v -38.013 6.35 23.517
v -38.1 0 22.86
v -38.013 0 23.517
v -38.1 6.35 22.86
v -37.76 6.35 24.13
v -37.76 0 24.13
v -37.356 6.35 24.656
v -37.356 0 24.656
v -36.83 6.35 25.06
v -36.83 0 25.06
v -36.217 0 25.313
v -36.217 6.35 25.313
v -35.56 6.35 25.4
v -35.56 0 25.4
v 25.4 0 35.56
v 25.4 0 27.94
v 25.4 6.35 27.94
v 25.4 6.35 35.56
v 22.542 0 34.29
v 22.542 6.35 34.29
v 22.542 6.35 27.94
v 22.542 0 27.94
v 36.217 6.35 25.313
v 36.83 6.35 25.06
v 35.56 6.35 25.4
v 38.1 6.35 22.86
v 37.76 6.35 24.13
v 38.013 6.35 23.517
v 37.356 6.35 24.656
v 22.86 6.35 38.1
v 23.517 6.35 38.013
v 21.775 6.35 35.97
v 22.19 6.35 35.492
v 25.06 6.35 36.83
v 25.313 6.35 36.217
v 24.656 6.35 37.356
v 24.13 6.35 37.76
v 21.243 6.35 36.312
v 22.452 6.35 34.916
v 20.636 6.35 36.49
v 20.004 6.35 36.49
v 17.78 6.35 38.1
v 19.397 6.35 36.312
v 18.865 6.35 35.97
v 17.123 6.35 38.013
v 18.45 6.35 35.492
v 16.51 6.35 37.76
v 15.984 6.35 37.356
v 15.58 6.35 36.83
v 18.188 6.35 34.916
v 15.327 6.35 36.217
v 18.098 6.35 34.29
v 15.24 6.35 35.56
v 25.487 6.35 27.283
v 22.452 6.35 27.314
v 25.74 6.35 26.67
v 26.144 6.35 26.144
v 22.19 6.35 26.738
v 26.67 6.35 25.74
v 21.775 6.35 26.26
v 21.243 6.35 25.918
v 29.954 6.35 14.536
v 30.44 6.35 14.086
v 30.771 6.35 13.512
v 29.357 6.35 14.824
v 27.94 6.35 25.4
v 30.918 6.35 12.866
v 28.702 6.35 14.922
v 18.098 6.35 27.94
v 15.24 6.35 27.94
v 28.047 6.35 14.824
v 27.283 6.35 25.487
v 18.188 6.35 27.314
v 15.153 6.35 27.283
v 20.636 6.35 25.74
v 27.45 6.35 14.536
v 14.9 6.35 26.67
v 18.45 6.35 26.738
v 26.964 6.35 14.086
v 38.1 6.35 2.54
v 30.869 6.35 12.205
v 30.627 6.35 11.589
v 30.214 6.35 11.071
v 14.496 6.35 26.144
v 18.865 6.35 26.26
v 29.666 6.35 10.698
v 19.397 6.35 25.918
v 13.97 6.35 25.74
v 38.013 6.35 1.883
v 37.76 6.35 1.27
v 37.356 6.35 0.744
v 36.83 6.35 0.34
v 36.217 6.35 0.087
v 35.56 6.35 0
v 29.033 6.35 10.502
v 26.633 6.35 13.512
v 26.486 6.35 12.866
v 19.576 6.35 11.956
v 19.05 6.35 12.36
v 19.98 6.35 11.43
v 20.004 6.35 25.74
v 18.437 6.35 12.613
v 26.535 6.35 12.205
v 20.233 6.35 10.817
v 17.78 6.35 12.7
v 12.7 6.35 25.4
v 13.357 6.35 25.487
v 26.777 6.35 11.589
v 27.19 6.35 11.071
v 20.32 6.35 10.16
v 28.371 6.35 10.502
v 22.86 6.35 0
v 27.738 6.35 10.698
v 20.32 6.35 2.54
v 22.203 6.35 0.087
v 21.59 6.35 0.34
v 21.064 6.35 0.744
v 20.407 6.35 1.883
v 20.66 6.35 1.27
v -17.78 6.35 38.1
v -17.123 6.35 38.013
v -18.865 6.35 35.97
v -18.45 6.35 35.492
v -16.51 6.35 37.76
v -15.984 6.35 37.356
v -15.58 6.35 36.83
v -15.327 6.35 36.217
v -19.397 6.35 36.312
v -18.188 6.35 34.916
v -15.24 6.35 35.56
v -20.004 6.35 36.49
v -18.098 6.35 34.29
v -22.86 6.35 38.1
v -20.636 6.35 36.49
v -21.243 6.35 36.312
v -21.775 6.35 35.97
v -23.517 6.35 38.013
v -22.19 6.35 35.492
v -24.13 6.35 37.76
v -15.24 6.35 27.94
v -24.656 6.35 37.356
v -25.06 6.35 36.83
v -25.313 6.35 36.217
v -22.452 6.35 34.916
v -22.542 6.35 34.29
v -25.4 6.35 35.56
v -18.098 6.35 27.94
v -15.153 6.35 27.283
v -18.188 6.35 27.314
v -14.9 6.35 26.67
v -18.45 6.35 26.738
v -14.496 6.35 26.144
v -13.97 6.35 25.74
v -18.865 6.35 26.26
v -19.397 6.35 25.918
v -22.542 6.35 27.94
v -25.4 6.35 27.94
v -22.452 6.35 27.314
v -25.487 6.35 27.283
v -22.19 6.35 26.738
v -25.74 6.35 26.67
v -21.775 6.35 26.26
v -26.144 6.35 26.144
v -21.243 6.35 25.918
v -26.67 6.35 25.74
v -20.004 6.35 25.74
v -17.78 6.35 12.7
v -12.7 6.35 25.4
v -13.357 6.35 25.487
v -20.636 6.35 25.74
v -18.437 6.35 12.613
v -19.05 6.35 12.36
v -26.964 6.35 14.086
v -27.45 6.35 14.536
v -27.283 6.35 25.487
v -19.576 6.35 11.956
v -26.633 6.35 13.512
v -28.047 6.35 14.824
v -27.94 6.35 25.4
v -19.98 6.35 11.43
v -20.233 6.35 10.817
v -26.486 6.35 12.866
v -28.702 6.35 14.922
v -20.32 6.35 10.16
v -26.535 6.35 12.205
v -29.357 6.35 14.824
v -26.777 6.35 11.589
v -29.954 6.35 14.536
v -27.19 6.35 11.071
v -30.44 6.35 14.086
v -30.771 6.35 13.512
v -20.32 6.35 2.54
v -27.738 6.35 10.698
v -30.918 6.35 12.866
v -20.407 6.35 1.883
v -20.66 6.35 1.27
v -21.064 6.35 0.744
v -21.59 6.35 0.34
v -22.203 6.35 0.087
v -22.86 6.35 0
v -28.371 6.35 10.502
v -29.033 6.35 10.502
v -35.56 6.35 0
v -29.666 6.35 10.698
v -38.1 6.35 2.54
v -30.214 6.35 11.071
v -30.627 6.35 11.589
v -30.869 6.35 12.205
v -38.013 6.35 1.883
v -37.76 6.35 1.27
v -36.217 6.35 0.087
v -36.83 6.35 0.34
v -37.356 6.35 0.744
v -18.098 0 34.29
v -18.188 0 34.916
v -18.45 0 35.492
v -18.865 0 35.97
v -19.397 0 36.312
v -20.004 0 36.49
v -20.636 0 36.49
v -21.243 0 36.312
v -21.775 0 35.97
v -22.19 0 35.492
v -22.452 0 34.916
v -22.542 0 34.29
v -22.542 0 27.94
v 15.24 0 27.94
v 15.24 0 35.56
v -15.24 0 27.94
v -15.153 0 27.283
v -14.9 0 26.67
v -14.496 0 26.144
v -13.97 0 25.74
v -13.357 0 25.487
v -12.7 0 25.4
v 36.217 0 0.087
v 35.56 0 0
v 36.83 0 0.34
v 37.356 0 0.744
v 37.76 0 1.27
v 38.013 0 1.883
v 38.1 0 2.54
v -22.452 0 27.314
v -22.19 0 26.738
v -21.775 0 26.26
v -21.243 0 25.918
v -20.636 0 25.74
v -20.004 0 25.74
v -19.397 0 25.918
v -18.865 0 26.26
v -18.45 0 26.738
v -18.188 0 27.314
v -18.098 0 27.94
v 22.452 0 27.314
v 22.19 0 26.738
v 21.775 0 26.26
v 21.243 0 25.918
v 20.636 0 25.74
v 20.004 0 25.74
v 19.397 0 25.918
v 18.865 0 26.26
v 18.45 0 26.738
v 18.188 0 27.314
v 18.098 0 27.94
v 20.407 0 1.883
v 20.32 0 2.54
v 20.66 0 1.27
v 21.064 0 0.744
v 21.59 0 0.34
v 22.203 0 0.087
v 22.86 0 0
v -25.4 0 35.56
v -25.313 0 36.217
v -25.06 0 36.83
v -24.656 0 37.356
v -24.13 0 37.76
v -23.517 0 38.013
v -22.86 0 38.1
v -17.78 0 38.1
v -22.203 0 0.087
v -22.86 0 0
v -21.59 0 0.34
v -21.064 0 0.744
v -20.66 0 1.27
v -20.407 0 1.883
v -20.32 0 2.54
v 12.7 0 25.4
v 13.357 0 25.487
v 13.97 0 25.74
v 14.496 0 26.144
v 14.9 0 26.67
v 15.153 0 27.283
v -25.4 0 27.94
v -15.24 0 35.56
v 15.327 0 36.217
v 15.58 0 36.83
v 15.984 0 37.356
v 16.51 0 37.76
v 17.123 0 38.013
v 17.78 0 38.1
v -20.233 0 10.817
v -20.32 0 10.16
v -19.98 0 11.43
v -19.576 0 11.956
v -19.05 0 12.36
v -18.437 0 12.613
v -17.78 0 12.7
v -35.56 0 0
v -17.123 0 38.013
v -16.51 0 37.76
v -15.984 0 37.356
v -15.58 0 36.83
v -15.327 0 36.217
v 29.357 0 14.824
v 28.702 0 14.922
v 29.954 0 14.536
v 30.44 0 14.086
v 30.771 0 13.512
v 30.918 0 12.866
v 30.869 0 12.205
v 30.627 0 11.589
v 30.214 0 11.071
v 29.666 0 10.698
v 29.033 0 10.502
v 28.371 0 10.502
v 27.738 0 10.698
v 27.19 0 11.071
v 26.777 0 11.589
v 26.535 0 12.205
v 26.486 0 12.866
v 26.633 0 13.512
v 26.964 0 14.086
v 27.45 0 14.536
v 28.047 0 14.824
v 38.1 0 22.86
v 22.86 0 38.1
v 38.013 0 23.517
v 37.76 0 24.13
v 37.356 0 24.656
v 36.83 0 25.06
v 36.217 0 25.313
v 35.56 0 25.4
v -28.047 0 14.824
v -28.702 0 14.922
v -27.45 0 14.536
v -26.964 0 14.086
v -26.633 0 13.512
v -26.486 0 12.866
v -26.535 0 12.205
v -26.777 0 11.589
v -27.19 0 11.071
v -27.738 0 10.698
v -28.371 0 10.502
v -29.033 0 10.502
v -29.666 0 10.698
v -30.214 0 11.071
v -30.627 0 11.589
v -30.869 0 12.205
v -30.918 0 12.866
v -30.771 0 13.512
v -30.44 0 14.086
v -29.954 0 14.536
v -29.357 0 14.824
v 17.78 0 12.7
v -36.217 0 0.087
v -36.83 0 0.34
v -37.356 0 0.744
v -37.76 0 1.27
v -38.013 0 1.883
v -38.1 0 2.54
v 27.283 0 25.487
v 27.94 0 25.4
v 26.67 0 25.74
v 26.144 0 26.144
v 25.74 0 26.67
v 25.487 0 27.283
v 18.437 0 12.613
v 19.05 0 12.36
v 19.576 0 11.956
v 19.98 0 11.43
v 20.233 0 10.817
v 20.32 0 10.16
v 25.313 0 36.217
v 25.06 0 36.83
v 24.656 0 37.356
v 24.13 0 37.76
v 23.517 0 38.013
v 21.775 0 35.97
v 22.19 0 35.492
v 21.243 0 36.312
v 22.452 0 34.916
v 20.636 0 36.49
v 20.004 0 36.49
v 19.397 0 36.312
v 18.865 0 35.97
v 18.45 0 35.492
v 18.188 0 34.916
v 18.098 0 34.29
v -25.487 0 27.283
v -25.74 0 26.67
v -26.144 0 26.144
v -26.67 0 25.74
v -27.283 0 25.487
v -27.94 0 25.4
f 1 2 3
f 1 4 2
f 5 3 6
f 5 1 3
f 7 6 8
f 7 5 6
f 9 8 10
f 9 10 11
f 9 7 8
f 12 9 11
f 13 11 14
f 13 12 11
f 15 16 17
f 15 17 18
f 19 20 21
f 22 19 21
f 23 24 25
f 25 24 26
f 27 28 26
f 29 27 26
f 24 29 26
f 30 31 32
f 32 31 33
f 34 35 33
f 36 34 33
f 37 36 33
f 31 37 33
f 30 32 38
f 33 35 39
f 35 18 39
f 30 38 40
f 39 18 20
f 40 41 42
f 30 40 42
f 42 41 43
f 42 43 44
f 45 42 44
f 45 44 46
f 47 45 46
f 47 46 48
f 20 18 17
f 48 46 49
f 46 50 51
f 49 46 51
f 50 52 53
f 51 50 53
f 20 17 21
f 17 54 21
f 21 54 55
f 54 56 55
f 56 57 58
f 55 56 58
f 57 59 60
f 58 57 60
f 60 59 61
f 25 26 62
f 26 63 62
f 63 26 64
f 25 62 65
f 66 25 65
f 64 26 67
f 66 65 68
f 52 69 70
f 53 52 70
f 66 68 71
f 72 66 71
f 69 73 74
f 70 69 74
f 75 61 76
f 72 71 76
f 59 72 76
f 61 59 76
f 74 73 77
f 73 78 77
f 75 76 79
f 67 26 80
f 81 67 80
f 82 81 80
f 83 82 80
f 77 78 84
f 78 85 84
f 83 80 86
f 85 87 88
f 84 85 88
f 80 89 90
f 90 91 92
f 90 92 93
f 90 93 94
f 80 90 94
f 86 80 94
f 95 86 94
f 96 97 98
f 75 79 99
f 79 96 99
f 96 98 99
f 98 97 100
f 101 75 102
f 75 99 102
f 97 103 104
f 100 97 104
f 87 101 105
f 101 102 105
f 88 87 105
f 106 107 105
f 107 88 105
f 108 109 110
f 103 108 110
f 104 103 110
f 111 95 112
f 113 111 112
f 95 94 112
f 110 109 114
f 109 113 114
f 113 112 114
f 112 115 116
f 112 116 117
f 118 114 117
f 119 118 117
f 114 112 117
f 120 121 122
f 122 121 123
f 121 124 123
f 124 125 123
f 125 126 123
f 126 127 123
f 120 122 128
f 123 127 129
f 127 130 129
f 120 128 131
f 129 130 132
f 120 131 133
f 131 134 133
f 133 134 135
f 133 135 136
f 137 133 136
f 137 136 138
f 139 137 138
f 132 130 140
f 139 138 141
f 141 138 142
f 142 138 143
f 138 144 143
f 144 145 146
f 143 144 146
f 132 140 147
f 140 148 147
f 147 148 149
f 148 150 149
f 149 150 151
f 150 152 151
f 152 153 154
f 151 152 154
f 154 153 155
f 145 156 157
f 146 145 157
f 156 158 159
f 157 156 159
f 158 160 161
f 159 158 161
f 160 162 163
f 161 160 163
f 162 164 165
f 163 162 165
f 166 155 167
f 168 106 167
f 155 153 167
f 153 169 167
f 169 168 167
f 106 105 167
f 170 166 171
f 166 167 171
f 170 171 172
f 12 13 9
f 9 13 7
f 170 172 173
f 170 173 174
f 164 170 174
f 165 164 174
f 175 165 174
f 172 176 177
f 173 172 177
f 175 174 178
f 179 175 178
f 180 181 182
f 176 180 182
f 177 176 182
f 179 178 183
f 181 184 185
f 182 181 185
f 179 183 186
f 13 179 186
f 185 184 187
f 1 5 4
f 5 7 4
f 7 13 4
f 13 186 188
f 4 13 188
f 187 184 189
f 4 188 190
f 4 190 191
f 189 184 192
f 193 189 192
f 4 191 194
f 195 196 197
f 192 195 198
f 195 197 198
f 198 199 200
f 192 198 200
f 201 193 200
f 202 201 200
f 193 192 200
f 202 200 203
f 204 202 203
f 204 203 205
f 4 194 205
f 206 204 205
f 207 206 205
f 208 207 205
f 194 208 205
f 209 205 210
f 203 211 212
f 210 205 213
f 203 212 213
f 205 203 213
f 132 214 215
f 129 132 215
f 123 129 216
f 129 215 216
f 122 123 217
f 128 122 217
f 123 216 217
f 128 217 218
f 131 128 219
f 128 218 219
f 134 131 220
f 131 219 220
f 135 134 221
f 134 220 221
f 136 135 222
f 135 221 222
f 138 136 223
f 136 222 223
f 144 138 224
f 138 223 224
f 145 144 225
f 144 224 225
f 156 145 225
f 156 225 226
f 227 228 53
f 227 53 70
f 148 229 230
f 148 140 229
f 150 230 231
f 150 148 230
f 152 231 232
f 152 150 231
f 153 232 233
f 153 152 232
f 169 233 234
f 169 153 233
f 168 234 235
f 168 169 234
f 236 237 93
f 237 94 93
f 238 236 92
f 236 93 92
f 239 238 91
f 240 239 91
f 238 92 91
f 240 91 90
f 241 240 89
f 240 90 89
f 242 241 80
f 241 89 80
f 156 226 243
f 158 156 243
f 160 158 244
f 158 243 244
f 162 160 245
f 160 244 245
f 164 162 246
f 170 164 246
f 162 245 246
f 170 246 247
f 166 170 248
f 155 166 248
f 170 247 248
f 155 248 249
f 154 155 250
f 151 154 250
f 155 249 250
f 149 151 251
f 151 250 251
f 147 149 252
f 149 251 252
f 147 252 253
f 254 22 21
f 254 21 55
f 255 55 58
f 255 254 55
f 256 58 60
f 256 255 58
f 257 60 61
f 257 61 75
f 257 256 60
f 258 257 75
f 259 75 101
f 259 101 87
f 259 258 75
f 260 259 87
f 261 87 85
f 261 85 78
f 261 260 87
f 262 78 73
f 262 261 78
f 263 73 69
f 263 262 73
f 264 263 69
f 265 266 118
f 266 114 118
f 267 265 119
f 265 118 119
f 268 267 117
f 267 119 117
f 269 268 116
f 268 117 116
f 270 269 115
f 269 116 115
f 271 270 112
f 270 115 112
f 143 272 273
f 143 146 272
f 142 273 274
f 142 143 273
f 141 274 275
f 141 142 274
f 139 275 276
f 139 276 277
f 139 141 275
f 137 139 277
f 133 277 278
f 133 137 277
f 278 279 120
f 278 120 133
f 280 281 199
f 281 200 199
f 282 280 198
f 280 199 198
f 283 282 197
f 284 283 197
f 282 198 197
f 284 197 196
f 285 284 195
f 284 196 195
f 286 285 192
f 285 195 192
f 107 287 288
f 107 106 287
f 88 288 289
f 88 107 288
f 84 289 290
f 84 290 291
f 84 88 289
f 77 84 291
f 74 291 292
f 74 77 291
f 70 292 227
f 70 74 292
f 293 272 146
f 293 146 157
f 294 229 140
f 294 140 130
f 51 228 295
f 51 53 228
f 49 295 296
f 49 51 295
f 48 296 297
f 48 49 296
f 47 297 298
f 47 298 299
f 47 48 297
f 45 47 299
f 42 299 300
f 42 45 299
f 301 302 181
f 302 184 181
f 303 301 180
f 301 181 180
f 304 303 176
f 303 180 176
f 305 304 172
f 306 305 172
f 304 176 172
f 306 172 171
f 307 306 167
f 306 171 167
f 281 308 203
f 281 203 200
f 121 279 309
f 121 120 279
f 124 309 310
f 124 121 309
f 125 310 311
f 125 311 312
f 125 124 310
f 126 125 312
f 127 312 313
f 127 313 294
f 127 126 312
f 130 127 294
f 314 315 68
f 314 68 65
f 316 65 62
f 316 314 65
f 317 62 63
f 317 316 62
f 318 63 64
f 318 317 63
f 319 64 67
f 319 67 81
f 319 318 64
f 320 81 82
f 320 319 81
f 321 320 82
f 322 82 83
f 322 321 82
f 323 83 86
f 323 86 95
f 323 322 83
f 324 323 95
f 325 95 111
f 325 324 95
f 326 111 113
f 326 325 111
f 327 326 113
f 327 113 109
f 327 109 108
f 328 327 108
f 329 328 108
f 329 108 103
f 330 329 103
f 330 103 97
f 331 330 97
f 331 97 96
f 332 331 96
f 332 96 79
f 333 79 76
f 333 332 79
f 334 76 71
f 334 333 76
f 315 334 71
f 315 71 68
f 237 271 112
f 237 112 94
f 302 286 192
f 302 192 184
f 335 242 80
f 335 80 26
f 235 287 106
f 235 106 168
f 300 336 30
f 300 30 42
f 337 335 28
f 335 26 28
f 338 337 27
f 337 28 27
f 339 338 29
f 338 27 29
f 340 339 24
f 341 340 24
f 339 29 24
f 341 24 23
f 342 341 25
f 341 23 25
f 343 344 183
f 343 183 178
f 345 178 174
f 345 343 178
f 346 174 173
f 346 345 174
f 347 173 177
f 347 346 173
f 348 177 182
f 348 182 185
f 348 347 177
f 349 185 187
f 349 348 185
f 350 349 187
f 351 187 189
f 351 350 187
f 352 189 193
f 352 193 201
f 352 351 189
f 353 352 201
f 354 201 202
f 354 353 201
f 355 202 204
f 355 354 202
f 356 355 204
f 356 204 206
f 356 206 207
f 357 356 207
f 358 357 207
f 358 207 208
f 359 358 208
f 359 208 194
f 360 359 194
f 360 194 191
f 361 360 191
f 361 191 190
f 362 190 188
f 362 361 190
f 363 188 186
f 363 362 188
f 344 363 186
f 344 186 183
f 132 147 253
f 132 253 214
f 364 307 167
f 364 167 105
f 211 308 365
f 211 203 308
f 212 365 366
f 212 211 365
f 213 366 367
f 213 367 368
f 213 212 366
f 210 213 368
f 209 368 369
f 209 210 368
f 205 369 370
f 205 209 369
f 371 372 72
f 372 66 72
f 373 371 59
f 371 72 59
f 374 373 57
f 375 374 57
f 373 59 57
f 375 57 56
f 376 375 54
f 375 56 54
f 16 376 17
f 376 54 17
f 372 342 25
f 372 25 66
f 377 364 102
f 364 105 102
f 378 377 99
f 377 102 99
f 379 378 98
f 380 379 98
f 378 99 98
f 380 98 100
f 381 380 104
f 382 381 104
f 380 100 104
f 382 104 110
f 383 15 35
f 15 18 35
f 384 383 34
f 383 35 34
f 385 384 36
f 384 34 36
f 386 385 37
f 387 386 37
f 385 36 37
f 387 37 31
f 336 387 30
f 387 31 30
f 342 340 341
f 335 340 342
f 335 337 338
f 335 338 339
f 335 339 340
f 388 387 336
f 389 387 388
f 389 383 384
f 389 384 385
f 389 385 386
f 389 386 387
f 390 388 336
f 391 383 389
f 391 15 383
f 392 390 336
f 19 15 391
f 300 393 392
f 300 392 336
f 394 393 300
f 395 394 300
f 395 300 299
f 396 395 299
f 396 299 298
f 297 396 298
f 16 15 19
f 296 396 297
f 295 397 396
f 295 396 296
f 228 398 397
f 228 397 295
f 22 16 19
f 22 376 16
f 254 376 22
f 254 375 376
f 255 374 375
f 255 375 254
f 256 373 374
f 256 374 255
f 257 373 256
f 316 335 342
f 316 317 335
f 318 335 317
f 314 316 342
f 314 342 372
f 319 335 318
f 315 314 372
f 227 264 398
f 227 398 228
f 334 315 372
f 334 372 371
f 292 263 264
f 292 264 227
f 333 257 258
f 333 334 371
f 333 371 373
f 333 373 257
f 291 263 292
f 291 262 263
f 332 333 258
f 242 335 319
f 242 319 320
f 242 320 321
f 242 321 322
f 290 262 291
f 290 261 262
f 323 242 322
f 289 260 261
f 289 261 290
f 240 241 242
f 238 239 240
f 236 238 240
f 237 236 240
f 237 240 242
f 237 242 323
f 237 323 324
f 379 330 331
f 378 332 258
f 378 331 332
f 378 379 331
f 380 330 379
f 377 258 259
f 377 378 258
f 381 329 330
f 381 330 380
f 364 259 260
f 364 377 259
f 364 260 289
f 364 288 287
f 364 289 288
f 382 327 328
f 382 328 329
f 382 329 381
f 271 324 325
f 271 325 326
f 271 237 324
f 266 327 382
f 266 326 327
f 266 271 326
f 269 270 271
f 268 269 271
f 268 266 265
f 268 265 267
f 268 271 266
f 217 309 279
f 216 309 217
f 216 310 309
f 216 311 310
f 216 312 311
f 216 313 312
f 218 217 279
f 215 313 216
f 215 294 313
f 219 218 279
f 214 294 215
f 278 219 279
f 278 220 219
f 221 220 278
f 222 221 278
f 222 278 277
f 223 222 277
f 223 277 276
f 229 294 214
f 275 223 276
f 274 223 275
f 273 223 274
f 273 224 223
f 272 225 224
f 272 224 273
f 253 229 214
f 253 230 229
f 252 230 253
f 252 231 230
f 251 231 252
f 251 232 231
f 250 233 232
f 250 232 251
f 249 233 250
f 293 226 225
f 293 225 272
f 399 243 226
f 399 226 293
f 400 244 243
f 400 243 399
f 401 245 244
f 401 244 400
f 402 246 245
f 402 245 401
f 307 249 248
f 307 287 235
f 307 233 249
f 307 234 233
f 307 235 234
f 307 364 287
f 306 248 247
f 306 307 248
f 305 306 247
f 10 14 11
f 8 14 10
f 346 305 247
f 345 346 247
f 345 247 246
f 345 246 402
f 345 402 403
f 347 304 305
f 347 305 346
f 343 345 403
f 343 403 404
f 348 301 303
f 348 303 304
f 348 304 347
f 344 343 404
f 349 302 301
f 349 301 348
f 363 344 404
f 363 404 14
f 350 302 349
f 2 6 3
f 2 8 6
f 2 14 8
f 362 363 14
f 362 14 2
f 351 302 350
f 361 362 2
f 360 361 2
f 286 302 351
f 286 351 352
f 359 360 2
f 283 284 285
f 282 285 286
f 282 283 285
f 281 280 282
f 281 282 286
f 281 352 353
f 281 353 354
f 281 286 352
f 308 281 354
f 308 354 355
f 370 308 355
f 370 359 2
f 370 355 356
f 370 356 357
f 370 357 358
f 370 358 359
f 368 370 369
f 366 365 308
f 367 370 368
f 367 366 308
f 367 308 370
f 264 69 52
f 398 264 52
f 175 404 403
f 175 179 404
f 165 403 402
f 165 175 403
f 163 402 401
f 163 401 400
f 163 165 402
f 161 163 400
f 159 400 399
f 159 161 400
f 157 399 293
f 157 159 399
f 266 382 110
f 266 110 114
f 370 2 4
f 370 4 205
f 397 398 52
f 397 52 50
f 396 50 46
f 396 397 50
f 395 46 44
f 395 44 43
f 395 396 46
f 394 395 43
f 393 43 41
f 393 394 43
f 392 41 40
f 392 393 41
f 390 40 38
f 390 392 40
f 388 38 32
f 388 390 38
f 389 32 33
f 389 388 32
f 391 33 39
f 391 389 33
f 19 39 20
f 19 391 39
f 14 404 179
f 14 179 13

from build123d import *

# Parameters (mm, degrees)
SKETCH1_R           = 2.2225
BOSS_EXTRUDE1_DEPTH = 6.35
FILLET1_R           = 2.54


with BuildPart() as part:
    # Sketch1 → Boss-Extrude1 (new body)
    with BuildSketch(Plane(origin=(0, 0, 0), x_dir=(1, 0, 0), z_dir=(0, 1, 0))):
        Polygon((-38.1, 0), (-20.32, 0), (-20.32, -12.7), (20.32, -12.7), (20.32, 0), (38.1, 0), (38.1, -25.4), (25.4, -25.4), (25.4, -38.1), (15.24, -38.1), (15.24, -25.4), (-15.24, -25.4), (-15.24, -38.1), (-25.4, -38.1), (-25.4, -25.4), (-38.1, -25.4), align=None)
        with Locations(Location((-28.702, -12.7, 0), (0, 0, 270))):
            Circle(SKETCH1_R, mode=Mode.SUBTRACT)
        with Locations(Location((28.702, -12.7, 0), (0, 0, 270))):
            Circle(SKETCH1_R, mode=Mode.SUBTRACT)
        with BuildLine():
            Line((-18.0975, -27.94), (-18.0975, -34.29))
            ThreePointArc((-18.0975, -34.29), (-20.32, -36.5125), (-22.5425, -34.29))
            Line((-22.5425, -34.29), (-22.5425, -27.94))
            ThreePointArc((-22.5425, -27.94), (-20.32, -25.7175), (-18.0975, -27.94))
        make_face(mode=Mode.SUBTRACT)
        with BuildLine():
            Line((18.0975, -27.94), (18.0975, -34.29))
            ThreePointArc((18.0975, -34.29), (20.32, -36.5125), (22.5425, -34.29))
            Line((22.5425, -34.29), (22.5425, -27.94))
            ThreePointArc((22.5425, -27.94), (20.32, -25.7175), (18.0975, -27.94))
        make_face(mode=Mode.SUBTRACT)
    extrude(amount=BOSS_EXTRUDE1_DEPTH)

    # Fillet1
    fillet1_edges = [part.edges().sort_by_distance(p)[0] for p in [
        (38.1, 3.175, 0),
        (38.1, 3.175, 25.4),
        (25.4, 3.175, 25.4),
        (25.4, 3.175, 38.1),
        (15.24, 3.175, 38.1),
        (15.24, 3.175, 25.4),
        (-15.24, 3.175, 25.4),
        (-15.24, 3.175, 38.1),
        (-25.4, 3.175, 38.1),
        (-25.4, 3.175, 25.4),
        (-38.1, 3.175, 25.4),
        (-38.1, 3.175, 0),
        (-20.32, 3.175, 0),
        (-20.32, 3.175, 12.7),
        (20.32, 3.175, 12.7),
        (20.32, 3.175, 0),
    ]]
    fillet(fillet1_edges, radius=FILLET1_R)


solid = part.part
